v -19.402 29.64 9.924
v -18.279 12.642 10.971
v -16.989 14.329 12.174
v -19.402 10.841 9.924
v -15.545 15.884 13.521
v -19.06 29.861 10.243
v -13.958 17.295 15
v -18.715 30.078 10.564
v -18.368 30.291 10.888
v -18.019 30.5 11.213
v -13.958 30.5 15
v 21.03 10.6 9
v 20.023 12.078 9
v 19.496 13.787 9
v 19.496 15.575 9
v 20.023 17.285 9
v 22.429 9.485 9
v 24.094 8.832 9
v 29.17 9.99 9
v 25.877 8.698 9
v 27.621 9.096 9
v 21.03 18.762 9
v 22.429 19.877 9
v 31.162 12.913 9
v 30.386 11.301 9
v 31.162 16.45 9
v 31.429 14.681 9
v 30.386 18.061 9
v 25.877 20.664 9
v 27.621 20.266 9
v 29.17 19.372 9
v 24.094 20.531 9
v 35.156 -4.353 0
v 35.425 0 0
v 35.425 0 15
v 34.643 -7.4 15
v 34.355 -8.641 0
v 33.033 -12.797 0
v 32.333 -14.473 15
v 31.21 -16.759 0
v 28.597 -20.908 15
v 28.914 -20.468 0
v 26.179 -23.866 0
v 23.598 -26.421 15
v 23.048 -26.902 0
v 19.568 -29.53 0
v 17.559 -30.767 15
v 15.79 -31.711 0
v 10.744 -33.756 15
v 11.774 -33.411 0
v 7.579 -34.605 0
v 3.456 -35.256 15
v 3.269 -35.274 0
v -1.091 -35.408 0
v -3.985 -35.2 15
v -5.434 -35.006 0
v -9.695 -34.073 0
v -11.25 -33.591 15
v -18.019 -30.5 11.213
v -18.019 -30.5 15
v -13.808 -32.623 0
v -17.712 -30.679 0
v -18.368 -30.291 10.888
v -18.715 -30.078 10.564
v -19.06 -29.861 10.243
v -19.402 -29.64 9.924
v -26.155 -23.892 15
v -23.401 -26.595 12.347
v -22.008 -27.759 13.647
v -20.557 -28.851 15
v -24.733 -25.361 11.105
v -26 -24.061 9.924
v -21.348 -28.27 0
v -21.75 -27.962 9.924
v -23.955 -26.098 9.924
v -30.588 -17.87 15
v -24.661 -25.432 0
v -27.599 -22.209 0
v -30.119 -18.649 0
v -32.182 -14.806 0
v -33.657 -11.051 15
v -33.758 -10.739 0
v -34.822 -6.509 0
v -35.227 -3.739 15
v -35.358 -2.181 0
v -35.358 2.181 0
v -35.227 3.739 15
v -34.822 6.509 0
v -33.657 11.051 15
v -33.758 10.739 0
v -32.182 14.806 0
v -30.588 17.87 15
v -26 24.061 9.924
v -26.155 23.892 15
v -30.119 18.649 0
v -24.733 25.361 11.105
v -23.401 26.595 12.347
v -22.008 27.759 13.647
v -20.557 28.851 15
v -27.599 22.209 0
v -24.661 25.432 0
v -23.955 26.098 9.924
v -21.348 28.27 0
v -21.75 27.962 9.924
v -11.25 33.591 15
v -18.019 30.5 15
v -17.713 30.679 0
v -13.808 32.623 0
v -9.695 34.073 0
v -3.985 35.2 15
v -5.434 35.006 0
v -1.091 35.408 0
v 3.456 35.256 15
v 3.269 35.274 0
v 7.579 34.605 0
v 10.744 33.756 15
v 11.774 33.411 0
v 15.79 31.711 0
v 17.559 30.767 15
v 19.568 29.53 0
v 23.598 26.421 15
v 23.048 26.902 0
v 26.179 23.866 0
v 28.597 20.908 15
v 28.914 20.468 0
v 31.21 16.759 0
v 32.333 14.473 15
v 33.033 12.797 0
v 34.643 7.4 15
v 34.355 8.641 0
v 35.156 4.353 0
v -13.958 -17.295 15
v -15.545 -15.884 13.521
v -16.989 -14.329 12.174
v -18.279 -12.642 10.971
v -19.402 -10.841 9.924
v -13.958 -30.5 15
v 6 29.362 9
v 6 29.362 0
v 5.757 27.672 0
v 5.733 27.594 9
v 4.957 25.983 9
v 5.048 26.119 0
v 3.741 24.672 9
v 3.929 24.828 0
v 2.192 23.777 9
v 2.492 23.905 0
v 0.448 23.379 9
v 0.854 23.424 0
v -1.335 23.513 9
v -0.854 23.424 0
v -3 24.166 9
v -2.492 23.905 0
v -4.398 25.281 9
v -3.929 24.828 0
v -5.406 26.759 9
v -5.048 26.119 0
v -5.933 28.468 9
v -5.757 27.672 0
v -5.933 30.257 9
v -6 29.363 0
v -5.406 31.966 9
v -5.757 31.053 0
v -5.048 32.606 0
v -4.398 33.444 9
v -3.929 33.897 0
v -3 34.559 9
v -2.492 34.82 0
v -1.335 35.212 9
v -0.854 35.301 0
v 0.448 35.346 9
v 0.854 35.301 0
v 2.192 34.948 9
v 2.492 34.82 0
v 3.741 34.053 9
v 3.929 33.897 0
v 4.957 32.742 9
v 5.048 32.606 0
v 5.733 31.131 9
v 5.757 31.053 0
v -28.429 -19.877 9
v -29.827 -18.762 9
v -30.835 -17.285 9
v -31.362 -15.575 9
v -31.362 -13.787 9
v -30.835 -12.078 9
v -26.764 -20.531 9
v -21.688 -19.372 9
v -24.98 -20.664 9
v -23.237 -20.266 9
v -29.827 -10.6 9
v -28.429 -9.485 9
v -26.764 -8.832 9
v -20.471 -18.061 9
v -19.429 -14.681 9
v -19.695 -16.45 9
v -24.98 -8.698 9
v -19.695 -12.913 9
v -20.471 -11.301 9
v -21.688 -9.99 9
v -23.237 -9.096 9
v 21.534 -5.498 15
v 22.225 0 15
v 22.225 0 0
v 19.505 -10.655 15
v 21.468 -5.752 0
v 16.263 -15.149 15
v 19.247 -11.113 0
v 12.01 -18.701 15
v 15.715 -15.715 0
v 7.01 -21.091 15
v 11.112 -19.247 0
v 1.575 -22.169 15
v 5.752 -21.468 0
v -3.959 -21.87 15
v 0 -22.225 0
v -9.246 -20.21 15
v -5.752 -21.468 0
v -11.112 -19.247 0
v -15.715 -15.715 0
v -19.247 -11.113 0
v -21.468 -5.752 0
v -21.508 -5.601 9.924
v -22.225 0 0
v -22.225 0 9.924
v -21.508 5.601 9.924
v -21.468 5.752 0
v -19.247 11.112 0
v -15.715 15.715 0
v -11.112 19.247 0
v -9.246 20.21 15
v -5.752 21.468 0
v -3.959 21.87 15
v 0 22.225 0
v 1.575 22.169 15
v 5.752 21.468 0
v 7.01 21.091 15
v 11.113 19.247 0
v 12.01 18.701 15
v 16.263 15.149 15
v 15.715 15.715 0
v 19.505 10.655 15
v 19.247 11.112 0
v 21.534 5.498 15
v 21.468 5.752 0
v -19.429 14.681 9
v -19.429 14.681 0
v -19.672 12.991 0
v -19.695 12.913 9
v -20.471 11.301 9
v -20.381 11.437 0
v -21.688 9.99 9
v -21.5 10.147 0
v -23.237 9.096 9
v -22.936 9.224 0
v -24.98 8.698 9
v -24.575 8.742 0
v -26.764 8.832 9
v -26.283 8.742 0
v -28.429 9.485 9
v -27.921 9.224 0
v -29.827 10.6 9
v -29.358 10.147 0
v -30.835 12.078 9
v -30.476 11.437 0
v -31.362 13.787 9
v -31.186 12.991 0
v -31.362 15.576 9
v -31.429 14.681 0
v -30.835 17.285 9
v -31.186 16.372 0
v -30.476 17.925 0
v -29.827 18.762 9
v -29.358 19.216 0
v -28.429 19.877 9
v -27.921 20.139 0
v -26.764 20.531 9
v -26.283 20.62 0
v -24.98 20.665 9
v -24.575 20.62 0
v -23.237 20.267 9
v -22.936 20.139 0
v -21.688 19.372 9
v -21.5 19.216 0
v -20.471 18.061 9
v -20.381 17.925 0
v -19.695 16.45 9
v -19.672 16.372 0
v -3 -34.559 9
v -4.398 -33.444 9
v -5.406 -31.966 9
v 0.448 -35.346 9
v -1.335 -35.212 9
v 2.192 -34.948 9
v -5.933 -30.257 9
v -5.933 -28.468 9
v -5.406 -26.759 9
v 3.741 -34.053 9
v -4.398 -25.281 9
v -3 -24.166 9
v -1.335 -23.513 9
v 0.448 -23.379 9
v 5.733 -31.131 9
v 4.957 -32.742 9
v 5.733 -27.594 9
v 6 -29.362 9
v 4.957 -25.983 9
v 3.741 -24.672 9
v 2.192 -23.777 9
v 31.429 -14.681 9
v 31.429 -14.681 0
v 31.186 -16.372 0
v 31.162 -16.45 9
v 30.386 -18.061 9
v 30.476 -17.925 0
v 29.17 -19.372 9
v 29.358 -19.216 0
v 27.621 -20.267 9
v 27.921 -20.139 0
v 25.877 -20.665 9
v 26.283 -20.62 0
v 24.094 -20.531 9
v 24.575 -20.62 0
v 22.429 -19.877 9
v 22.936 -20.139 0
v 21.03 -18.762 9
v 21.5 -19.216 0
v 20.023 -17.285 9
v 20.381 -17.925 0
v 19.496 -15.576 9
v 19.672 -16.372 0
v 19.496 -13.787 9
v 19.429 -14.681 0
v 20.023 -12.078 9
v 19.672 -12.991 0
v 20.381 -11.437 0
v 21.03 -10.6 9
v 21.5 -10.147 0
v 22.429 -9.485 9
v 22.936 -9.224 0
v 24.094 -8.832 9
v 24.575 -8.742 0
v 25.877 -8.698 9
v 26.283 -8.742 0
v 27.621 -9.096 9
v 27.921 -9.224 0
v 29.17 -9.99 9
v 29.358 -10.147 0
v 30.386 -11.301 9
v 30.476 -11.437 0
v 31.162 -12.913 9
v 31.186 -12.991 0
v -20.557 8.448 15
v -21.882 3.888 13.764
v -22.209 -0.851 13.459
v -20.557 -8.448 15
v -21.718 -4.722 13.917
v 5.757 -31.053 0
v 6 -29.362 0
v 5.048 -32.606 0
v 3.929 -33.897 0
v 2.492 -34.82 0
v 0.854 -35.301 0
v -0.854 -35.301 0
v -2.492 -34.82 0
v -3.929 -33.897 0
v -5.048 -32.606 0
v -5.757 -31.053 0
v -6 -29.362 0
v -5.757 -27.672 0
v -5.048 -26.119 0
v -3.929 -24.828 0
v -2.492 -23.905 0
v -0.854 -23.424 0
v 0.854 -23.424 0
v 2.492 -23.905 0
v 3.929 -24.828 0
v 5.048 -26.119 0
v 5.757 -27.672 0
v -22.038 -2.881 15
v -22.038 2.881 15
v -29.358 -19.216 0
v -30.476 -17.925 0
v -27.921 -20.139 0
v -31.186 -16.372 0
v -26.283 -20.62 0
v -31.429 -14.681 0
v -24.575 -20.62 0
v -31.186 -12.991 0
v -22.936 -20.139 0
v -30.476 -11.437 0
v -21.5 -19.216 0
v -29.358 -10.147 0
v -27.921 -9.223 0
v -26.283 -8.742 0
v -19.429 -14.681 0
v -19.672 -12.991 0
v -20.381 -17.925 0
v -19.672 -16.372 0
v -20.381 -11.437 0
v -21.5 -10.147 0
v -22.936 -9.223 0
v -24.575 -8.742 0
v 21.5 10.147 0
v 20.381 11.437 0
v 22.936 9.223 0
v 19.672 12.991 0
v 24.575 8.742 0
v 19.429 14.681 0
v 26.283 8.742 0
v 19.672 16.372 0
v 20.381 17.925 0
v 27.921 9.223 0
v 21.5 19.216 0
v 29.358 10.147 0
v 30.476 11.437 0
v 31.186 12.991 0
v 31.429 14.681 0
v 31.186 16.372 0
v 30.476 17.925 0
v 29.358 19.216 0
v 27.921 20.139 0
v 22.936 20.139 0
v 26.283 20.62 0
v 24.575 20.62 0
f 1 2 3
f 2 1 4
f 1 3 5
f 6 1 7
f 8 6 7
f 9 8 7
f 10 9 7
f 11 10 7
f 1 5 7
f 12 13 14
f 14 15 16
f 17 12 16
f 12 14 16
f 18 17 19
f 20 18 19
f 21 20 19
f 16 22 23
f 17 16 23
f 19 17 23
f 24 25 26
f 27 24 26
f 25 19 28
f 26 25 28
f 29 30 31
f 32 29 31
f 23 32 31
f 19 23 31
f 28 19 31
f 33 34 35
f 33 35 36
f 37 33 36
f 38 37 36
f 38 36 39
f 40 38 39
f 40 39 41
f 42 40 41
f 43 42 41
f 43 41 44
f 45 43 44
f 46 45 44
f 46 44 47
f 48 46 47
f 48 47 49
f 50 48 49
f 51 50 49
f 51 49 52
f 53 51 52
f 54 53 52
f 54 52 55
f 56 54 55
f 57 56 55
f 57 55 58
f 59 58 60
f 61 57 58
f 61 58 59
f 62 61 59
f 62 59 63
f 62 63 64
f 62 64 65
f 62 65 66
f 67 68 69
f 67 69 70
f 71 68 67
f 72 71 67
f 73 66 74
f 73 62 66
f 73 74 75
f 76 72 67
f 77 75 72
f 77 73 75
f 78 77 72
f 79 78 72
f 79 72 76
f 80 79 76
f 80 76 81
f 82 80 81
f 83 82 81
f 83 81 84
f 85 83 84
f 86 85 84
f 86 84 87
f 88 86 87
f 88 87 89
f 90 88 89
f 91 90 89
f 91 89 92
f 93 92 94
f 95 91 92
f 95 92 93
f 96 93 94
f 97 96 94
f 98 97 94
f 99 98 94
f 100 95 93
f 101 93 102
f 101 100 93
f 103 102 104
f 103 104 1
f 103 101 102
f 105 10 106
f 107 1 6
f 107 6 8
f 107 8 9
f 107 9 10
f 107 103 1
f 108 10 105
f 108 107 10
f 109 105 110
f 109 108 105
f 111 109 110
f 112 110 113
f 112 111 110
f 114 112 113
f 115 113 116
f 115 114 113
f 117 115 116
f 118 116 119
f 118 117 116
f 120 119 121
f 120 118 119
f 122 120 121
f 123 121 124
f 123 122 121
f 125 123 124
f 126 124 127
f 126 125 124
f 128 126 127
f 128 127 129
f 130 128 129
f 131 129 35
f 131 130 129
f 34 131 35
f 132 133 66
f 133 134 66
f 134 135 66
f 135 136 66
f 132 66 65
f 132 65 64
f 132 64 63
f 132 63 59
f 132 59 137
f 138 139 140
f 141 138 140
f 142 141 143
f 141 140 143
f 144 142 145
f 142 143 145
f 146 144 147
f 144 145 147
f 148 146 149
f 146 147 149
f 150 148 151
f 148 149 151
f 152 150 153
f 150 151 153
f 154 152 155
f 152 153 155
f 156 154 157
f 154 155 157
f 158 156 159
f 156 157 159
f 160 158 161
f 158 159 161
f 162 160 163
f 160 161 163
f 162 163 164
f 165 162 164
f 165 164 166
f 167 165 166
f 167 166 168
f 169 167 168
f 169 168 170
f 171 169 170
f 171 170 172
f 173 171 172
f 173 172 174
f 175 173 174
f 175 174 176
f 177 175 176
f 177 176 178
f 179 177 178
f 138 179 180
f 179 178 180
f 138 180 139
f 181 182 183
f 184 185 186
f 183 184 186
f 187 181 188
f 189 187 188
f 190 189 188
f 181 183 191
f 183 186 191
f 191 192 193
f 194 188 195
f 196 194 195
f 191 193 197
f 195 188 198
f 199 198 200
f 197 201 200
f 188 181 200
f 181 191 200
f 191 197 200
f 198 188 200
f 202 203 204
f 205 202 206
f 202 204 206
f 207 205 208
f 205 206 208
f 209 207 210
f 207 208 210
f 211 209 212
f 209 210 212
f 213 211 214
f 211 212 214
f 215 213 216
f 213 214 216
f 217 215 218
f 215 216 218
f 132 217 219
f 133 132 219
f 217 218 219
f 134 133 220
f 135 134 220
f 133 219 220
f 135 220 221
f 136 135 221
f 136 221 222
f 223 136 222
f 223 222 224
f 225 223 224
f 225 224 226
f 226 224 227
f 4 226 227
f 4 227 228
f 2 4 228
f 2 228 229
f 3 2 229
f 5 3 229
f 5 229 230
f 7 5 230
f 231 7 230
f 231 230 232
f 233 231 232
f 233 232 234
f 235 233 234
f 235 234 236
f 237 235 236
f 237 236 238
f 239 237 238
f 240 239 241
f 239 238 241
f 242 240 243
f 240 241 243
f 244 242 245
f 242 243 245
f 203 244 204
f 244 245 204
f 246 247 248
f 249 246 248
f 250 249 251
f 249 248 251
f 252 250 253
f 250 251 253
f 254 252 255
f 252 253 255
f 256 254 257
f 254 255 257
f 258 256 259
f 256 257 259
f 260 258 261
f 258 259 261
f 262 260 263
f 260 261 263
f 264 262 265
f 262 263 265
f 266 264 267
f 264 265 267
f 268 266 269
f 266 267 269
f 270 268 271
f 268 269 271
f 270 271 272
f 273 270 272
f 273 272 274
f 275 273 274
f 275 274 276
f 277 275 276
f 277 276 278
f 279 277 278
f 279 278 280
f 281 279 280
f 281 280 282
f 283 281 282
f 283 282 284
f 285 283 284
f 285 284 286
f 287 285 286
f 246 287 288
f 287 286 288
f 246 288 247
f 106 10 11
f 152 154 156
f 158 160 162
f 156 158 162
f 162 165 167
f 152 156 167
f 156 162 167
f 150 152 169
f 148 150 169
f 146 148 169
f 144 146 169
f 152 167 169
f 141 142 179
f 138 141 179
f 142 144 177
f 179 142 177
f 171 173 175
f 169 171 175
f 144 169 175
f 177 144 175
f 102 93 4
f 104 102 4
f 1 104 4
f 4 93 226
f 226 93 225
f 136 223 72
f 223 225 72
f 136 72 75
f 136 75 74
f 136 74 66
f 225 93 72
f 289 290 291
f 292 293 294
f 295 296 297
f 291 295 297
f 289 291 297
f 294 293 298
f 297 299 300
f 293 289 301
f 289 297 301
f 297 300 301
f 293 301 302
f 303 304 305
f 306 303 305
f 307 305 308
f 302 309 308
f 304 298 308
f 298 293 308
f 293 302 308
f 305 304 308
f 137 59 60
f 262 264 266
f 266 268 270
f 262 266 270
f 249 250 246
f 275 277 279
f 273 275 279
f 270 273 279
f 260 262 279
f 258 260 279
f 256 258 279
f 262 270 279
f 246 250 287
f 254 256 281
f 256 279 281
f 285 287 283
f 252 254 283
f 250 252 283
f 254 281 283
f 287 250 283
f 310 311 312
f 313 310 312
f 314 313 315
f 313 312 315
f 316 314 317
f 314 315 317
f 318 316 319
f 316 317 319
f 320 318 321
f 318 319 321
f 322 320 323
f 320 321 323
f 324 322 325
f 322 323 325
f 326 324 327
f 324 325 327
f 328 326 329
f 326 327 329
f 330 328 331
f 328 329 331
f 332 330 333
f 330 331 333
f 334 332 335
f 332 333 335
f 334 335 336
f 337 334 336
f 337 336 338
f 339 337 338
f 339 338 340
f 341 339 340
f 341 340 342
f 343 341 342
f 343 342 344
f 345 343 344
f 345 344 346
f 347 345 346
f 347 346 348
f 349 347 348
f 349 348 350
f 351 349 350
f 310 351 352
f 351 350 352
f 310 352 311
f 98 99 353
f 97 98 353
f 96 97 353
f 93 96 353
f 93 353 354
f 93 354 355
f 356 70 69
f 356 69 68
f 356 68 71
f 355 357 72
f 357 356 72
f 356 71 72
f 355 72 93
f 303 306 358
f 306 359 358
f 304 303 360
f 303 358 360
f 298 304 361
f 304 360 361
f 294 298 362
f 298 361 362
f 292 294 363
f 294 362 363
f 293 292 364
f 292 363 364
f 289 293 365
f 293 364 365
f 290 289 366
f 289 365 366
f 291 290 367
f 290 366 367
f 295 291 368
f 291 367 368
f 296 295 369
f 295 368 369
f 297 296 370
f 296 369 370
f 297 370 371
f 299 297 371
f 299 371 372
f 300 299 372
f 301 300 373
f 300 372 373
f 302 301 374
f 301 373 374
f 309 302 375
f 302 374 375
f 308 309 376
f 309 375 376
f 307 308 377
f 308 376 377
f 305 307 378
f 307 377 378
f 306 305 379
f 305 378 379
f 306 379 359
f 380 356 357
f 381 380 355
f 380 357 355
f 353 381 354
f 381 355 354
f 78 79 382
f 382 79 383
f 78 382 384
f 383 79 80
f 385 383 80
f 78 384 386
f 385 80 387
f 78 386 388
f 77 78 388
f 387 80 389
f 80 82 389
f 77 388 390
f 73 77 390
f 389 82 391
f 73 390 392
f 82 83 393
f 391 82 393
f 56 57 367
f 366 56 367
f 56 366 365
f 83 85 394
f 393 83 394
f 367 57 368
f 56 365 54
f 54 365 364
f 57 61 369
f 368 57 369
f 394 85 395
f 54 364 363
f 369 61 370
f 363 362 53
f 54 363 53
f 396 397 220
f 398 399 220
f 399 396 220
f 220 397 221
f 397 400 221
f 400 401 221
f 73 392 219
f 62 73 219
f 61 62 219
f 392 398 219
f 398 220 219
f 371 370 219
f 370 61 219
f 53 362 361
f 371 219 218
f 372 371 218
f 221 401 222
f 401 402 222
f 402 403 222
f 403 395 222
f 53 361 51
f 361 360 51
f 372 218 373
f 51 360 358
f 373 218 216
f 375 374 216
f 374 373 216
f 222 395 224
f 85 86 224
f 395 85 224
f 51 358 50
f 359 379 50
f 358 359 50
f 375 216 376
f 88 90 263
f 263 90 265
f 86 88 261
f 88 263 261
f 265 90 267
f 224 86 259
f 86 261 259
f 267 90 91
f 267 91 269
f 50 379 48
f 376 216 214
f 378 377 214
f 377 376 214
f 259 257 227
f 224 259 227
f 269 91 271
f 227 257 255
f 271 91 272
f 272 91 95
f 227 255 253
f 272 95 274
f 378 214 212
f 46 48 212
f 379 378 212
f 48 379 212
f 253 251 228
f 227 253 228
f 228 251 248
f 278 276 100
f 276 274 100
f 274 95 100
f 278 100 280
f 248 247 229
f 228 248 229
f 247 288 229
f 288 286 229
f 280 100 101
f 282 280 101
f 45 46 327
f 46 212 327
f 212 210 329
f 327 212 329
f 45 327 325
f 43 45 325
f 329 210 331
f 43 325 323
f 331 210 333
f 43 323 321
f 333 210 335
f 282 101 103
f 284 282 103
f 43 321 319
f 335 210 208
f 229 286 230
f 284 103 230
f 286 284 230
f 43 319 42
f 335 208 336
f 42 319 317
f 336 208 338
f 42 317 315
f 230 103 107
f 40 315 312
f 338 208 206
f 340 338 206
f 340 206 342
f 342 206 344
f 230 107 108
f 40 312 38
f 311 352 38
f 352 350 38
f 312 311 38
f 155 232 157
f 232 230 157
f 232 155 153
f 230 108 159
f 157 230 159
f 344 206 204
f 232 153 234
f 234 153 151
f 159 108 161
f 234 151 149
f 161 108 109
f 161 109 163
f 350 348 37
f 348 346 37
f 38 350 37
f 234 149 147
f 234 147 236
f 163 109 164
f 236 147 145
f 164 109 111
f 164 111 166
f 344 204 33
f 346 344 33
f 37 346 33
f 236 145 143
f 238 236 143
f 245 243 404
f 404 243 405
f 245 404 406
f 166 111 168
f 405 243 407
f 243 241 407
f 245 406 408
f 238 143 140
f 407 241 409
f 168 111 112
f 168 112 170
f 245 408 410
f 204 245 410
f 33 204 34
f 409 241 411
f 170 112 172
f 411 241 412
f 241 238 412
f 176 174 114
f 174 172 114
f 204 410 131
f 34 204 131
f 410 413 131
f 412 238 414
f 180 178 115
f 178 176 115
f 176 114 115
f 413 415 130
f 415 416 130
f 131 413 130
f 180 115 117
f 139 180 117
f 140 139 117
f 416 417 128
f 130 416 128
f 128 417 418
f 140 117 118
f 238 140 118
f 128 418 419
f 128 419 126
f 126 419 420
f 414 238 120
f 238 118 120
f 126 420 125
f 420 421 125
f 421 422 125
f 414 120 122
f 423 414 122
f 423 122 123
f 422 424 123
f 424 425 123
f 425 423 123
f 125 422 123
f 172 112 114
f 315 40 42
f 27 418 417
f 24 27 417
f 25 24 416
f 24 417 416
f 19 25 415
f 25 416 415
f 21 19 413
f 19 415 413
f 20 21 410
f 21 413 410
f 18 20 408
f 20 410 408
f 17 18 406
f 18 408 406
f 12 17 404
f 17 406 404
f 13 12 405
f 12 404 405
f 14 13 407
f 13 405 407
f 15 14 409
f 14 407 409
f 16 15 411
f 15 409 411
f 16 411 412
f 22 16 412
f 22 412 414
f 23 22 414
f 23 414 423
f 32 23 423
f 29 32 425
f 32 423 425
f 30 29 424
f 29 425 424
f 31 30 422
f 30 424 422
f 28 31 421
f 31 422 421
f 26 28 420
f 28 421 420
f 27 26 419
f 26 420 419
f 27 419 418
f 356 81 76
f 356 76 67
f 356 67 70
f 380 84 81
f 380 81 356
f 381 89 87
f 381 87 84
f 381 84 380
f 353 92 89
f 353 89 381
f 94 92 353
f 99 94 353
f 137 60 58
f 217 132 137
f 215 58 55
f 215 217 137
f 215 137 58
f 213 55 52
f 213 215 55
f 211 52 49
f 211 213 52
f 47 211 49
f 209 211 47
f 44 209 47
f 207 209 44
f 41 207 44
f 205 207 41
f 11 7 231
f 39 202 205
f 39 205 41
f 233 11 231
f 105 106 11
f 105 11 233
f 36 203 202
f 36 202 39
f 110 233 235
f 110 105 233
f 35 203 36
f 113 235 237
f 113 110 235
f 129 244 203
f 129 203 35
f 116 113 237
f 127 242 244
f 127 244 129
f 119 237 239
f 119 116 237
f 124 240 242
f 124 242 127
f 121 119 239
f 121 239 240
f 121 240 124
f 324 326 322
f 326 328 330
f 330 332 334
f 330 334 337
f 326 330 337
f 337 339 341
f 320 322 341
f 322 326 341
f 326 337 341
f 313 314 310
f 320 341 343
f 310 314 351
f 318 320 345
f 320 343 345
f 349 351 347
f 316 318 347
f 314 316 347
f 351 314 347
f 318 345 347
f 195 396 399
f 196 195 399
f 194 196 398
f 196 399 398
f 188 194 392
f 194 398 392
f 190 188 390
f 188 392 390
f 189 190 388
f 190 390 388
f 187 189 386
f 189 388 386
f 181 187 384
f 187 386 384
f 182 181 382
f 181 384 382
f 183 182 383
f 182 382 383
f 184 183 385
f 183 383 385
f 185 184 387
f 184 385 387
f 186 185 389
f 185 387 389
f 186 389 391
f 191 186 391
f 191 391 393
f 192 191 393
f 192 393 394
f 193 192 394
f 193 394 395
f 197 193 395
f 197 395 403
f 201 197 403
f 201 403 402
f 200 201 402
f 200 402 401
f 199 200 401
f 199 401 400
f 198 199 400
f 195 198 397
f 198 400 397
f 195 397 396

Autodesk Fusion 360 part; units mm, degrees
sketch "Sketch1" plane through (0, 0, 0) normal (0, 0, 1) x (1, 0, 0)
  circle A0 centre (0, 0) radius 22.225
  circle A1 centre (0, 0) radius 35.425
  circle A2 centre (0, 29.3625) radius 6
  circle A3 centre (-25.4287, 14.6813) radius 6
  circle A4 centre (-25.4287, -14.6812) radius 6
  circle A5 centre (0, -29.3625) radius 6
  circle A6 centre (25.4287, -14.6813) radius 6
  circle A7 centre (25.4287, 14.6812) radius 6
  dimension "d1" = 44.45
  dimension "d2" = 70.85
  dimension "d3" = 12
  dimension "d4" = 29.3625
  dimension "d6" = 360
extrude "Extrude1" add sketch "Sketch1" along normal blind 15 contours A1 | A2 | A3 | A4 | A5 | A6 | A7 makes body 1
extrude "Extrude2" cut sketch "Sketch1" along normal blind 9 contours A2 | A3 | A4 | A5 | A6 | A7 bodies 1
sketch "Sketch2" plane through (0, 0, 0) normal (0, 1, 0) x (1, 0, 0)
  line L0 (-15.955, -19.2911) -> (-26, -9.924)
  line L1 (-26, -9.924) -> (-19.4017, -9.924)
  line L2 (-19.4017, -9.924) -> (-12.886, -16)
  line L3 (-12.886, -16) -> (-15.955, -19.2911)
  line L4 (0, 0) -> (0, -30.1801) construction
  line L5 (-35.425, -15) -> (35.425, -15)
  dimension "d11" = 47
  dimension "d12" = 4.5
  dimension "d13" = 5.076
  dimension "d14" = 26
  dimension "d15" = 1
extrude "Extrude3" cut sketch "Sketch2" along normal mid plane 61 bodies 1
copy_body "Body->Comp1" bodies 1 removing the originals makes body 2 in component "Component"
sketch "Sketch3" plane through (0, 0, 0) normal (0, 1, 0) x (1, 0, 0)
  line L0 (0, -15) -> (50, -4)
  line L1 (50, -4) -> (50, -15)
  line L2 (0, -15) -> (50, -15)
  line L3 (-18.0189, -15) -> (35.425, -15)
  dimension "d19" = 50
  dimension "d25" = 11
component "Component" placed x (1, 0, 0) y (0, 1, 0) z (0, 0, 1) at (0, 0, 0)
